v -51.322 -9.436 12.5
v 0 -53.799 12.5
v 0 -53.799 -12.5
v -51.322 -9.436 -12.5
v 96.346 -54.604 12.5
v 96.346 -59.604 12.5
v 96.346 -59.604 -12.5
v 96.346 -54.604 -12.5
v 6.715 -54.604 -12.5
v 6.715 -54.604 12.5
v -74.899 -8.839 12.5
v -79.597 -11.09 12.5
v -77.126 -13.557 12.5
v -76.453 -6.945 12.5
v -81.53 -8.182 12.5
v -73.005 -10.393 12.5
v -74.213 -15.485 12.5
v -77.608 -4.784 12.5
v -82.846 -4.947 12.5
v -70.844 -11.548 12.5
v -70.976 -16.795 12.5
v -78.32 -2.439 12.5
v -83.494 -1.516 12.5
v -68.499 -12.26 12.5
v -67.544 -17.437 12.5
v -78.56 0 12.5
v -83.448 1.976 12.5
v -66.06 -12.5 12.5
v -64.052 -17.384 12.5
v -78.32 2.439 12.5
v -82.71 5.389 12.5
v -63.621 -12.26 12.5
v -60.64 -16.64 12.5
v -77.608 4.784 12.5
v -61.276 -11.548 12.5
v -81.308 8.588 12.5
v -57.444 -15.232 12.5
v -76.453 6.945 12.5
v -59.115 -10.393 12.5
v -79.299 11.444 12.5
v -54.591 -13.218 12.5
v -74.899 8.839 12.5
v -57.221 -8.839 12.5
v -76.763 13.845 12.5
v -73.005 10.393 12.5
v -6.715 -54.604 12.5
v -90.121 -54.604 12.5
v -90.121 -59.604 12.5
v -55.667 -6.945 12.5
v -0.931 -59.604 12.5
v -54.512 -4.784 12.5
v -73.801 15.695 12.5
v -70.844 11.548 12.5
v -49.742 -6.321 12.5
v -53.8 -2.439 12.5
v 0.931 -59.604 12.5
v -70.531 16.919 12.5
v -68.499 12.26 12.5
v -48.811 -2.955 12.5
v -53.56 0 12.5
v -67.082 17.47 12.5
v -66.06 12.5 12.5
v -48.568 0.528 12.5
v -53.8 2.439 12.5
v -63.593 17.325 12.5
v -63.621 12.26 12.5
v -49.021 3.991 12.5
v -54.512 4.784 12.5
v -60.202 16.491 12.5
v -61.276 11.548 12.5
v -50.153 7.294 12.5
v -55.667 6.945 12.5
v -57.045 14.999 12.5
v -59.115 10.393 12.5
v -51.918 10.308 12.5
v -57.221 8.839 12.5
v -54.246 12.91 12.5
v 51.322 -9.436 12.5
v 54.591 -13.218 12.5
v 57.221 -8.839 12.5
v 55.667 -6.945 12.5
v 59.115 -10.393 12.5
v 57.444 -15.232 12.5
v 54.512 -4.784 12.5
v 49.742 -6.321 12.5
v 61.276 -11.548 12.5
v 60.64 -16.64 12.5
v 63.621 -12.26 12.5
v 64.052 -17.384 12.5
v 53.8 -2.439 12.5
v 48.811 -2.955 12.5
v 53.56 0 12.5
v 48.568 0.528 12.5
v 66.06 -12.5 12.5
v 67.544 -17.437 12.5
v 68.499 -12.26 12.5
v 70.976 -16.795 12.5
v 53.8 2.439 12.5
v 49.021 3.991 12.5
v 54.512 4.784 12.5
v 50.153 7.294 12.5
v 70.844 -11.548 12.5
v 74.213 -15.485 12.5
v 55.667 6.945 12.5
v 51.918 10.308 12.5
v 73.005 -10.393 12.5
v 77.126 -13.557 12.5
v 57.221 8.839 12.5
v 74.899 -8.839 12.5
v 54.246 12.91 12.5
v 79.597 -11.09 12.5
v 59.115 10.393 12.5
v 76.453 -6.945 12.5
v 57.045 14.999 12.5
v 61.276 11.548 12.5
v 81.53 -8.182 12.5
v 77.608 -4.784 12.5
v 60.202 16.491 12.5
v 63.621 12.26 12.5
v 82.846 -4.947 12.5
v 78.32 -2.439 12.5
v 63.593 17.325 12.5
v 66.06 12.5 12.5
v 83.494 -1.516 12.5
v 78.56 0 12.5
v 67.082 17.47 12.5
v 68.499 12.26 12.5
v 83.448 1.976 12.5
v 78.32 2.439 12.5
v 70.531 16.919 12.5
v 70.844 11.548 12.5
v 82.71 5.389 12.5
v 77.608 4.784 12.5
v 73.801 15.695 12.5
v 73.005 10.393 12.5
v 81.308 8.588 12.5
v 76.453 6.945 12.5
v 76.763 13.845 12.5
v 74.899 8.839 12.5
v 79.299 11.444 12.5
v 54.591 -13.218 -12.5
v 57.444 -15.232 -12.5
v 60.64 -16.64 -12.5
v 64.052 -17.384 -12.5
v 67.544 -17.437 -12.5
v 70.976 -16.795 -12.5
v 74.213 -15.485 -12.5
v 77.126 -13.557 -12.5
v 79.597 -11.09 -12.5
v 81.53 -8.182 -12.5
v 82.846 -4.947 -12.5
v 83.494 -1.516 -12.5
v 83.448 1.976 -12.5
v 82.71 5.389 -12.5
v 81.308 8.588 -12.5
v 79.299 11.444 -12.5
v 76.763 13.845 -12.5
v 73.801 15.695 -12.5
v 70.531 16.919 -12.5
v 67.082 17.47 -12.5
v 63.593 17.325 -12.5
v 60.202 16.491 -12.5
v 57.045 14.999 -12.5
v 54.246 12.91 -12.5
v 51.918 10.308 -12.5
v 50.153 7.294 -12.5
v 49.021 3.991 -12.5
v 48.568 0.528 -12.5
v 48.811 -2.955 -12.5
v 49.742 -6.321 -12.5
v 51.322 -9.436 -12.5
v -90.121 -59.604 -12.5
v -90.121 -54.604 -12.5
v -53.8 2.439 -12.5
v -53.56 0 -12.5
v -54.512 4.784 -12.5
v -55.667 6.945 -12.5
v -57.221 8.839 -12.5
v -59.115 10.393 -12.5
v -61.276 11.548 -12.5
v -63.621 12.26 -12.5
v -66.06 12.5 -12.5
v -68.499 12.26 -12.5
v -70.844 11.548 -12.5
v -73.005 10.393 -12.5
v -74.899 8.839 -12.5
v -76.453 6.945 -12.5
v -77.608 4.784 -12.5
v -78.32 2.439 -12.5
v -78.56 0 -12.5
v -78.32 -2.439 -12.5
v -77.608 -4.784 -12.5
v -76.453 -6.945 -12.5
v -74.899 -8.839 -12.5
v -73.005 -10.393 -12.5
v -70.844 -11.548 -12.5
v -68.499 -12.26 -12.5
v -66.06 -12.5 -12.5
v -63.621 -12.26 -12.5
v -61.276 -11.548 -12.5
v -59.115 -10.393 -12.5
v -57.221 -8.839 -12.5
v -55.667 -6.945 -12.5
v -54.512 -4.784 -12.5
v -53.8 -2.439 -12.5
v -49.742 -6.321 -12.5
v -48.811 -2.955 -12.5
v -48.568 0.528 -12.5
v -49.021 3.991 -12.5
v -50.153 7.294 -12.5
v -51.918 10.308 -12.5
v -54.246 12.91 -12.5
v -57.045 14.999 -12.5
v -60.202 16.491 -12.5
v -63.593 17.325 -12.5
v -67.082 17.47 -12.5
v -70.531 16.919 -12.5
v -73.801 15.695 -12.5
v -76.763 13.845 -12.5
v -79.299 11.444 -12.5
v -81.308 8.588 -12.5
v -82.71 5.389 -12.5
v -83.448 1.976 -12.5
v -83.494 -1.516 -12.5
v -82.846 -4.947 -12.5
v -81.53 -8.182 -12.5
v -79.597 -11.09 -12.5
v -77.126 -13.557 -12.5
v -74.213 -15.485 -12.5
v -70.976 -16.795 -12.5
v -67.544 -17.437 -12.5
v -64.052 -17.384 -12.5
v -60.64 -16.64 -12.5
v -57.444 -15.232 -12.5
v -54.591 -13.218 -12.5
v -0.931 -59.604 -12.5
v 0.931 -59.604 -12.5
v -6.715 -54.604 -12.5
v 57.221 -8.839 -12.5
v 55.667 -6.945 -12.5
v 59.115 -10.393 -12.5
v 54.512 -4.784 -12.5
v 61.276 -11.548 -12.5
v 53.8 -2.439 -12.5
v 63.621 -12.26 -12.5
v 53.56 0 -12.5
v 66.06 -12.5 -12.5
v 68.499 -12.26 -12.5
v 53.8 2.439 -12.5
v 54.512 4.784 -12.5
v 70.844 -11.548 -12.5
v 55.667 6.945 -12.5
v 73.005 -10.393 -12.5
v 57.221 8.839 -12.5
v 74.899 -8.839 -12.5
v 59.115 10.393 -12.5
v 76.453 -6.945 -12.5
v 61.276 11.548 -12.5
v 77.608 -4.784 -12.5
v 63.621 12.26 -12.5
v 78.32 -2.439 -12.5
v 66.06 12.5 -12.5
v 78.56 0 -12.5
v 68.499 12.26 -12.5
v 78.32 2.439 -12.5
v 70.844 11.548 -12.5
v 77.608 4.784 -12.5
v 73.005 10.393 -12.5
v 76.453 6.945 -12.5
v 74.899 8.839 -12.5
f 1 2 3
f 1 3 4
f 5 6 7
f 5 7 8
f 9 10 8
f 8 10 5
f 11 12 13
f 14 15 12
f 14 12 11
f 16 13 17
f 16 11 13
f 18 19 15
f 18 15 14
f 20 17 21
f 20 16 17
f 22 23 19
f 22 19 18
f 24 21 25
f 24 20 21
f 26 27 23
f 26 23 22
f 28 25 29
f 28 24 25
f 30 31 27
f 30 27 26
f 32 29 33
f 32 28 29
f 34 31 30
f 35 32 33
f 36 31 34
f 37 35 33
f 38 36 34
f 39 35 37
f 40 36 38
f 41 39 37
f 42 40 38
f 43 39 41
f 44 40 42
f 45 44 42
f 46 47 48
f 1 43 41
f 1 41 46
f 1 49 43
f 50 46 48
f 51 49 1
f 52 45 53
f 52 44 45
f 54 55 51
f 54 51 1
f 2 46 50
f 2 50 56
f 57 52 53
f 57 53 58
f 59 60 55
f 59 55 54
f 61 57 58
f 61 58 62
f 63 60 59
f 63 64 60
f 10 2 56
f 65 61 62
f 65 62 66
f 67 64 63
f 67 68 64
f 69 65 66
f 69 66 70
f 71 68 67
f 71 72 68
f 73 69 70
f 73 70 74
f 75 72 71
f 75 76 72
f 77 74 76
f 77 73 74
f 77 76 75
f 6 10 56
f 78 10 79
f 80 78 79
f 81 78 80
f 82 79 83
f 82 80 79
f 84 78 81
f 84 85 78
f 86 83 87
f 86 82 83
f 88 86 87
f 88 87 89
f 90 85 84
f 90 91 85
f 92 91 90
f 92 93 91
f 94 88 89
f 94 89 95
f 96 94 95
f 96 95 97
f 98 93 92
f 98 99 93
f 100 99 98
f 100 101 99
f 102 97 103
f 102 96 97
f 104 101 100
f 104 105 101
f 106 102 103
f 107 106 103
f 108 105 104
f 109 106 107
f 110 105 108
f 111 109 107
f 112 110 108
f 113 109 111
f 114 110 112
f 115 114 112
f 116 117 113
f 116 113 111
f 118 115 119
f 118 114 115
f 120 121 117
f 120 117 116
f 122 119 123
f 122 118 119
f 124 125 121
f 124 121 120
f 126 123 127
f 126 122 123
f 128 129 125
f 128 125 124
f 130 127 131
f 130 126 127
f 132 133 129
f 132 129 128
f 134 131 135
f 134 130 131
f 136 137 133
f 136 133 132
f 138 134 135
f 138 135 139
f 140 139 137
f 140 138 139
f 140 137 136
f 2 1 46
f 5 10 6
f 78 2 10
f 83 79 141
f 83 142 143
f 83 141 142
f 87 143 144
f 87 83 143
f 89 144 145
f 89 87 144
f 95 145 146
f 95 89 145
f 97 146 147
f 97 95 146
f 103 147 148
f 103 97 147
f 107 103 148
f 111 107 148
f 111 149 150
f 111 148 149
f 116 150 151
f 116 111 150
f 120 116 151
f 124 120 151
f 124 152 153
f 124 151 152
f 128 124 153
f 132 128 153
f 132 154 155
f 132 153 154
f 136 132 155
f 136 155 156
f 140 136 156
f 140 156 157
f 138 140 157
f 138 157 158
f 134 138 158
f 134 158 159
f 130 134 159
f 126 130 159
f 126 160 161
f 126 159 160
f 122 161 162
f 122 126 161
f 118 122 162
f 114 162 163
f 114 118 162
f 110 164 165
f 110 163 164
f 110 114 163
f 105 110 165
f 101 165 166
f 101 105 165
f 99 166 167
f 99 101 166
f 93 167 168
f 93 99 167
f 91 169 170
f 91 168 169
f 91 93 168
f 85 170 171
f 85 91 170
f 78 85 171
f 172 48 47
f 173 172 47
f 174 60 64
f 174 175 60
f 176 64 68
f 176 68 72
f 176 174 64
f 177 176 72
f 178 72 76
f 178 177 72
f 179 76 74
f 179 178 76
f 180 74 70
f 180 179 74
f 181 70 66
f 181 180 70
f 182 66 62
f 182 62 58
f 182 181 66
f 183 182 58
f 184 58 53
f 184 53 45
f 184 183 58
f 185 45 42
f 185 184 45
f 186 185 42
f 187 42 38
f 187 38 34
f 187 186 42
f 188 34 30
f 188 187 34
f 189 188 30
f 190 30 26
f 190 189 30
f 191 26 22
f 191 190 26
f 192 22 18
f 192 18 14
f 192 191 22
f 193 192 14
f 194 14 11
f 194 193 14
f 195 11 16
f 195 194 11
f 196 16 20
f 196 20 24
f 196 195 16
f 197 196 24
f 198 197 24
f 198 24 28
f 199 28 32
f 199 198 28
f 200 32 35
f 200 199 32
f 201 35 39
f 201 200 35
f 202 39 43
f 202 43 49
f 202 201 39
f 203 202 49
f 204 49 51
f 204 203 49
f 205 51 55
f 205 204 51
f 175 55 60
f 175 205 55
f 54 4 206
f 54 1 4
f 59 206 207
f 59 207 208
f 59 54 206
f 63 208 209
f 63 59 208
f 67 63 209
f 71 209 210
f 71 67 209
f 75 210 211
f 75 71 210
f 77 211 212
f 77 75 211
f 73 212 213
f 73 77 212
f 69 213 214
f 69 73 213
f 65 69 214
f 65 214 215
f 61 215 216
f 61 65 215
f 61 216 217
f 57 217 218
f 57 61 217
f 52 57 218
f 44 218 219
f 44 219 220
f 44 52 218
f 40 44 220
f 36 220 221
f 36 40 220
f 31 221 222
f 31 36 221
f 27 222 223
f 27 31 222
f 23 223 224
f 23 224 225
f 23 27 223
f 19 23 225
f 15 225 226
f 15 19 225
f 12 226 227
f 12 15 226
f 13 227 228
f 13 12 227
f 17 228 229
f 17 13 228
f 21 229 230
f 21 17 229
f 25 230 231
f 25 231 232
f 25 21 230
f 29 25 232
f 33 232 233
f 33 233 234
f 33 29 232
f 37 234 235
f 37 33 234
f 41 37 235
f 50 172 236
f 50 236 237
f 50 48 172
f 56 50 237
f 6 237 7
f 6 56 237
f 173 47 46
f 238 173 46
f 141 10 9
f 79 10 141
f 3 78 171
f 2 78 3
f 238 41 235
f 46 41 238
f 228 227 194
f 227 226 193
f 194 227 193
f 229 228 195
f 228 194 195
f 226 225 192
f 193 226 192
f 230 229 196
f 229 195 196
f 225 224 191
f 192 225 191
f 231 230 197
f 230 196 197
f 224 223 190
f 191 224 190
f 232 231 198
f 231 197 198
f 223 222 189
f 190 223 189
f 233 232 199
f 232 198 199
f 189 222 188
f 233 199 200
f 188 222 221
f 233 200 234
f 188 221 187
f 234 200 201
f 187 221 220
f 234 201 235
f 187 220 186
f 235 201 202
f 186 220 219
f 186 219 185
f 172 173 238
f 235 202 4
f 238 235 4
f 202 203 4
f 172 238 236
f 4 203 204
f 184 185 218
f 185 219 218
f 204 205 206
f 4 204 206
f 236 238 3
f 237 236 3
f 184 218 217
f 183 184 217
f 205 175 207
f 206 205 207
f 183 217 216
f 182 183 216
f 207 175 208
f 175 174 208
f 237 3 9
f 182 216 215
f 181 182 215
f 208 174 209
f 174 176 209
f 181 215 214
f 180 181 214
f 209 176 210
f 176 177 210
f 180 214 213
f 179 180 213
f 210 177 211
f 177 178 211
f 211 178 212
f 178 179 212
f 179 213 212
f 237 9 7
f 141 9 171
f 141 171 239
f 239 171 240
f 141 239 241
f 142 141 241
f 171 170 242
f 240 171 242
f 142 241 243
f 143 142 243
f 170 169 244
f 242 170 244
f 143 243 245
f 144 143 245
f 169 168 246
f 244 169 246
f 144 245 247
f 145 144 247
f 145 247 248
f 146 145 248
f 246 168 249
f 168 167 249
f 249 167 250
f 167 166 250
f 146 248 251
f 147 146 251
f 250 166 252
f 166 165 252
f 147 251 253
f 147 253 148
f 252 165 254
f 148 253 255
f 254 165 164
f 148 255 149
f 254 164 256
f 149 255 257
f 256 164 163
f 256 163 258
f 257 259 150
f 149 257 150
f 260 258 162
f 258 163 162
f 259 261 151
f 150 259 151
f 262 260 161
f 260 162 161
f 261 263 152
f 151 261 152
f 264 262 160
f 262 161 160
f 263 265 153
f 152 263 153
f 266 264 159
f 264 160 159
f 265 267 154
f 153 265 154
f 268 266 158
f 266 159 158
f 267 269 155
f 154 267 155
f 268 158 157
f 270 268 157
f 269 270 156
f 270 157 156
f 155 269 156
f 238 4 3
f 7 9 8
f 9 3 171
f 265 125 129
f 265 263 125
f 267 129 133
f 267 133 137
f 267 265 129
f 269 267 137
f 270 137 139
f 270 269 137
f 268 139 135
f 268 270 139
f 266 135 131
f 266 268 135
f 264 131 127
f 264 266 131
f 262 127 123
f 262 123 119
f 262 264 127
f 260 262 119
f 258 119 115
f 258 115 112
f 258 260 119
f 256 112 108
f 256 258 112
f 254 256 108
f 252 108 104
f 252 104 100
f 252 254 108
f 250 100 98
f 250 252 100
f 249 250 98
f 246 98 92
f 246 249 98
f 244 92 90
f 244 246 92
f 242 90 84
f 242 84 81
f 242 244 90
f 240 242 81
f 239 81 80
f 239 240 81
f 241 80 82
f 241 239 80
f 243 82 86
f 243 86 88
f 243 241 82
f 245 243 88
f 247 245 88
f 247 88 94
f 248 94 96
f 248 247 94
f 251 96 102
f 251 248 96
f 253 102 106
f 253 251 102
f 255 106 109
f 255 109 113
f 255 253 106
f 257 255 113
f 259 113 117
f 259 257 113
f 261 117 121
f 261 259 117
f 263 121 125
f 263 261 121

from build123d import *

# Parameters (mm, degrees)
SKETCH1_R               = 17.5
SKETCH1_R_2             = 12.5
EXTRUDE_THIN1_DEPTH     = 12.5
EXTRUDE_THIN1_2_DEPTH   = 12.5
SKETCH2_W               = 186.467509327
SKETCH2_H               = 5
EXTRUDE_THIN2_DEPTH     = 12.5
SKETCH3_W               = 9.044887752
SKETCH3_H               = 4.781773829
CUT_EXTRUDE1_DEPTH      = 13.5
CUT_EXTRUDE1_DEPTH_BACK = 13.5


with BuildPart() as part:
    # Sketch1 → Extrude-Thin1 (new body, symmetric)
    with BuildSketch(Plane.XY):
        with Locations((-66.06, 0)):
            Circle(SKETCH1_R)
        with Locations((-66.06, 0)):
            Circle(SKETCH1_R_2, mode=Mode.SUBTRACT)
    extrude(amount=EXTRUDE_THIN1_DEPTH, both=True)



with BuildPart() as body_2:
    # Sketch1 → Extrude-Thin1 2 (new body, symmetric)
    with BuildSketch(Plane.XY):
        with Locations((66.06, 0)):
            Circle(SKETCH1_R)
        with Locations((66.06, 0)):
            Circle(SKETCH1_R_2, mode=Mode.SUBTRACT)
    extrude(amount=EXTRUDE_THIN1_2_DEPTH, both=True)


with BuildPart() as part_1:
    add(part.part)

    add(body_2.part)  # Extrude-Thin2 merges body 2
    # Sketch2 → Extrude-Thin2 (add, symmetric)
    with BuildSketch(Plane.XY):
        Polygon((-57.1035212, -11.046786298), (0, -60.408556187), (56.960039317, -11.170815772), (53.690229399, -7.388178716), (0, -53.799410338), (-53.833711283, -7.264149241), align=None)
        with Locations((3.112302406, -57.103983263)):
            Rectangle(SKETCH2_W, SKETCH2_H)
    extrude(amount=EXTRUDE_THIN2_DEPTH, both=True)

    # Sketch3 → Cut-Extrude1 (cut, two sides)
    with BuildSketch(Plane.XY) as cut_extrude1_sk:
        with Locations((0.087674805, -61.994870178)):
            Rectangle(SKETCH3_W, SKETCH3_H)
    extrude(amount=CUT_EXTRUDE1_DEPTH, mode=Mode.SUBTRACT)
    extrude(cut_extrude1_sk.sketch, amount=-CUT_EXTRUDE1_DEPTH_BACK, mode=Mode.SUBTRACT)


solid = part_1.part
